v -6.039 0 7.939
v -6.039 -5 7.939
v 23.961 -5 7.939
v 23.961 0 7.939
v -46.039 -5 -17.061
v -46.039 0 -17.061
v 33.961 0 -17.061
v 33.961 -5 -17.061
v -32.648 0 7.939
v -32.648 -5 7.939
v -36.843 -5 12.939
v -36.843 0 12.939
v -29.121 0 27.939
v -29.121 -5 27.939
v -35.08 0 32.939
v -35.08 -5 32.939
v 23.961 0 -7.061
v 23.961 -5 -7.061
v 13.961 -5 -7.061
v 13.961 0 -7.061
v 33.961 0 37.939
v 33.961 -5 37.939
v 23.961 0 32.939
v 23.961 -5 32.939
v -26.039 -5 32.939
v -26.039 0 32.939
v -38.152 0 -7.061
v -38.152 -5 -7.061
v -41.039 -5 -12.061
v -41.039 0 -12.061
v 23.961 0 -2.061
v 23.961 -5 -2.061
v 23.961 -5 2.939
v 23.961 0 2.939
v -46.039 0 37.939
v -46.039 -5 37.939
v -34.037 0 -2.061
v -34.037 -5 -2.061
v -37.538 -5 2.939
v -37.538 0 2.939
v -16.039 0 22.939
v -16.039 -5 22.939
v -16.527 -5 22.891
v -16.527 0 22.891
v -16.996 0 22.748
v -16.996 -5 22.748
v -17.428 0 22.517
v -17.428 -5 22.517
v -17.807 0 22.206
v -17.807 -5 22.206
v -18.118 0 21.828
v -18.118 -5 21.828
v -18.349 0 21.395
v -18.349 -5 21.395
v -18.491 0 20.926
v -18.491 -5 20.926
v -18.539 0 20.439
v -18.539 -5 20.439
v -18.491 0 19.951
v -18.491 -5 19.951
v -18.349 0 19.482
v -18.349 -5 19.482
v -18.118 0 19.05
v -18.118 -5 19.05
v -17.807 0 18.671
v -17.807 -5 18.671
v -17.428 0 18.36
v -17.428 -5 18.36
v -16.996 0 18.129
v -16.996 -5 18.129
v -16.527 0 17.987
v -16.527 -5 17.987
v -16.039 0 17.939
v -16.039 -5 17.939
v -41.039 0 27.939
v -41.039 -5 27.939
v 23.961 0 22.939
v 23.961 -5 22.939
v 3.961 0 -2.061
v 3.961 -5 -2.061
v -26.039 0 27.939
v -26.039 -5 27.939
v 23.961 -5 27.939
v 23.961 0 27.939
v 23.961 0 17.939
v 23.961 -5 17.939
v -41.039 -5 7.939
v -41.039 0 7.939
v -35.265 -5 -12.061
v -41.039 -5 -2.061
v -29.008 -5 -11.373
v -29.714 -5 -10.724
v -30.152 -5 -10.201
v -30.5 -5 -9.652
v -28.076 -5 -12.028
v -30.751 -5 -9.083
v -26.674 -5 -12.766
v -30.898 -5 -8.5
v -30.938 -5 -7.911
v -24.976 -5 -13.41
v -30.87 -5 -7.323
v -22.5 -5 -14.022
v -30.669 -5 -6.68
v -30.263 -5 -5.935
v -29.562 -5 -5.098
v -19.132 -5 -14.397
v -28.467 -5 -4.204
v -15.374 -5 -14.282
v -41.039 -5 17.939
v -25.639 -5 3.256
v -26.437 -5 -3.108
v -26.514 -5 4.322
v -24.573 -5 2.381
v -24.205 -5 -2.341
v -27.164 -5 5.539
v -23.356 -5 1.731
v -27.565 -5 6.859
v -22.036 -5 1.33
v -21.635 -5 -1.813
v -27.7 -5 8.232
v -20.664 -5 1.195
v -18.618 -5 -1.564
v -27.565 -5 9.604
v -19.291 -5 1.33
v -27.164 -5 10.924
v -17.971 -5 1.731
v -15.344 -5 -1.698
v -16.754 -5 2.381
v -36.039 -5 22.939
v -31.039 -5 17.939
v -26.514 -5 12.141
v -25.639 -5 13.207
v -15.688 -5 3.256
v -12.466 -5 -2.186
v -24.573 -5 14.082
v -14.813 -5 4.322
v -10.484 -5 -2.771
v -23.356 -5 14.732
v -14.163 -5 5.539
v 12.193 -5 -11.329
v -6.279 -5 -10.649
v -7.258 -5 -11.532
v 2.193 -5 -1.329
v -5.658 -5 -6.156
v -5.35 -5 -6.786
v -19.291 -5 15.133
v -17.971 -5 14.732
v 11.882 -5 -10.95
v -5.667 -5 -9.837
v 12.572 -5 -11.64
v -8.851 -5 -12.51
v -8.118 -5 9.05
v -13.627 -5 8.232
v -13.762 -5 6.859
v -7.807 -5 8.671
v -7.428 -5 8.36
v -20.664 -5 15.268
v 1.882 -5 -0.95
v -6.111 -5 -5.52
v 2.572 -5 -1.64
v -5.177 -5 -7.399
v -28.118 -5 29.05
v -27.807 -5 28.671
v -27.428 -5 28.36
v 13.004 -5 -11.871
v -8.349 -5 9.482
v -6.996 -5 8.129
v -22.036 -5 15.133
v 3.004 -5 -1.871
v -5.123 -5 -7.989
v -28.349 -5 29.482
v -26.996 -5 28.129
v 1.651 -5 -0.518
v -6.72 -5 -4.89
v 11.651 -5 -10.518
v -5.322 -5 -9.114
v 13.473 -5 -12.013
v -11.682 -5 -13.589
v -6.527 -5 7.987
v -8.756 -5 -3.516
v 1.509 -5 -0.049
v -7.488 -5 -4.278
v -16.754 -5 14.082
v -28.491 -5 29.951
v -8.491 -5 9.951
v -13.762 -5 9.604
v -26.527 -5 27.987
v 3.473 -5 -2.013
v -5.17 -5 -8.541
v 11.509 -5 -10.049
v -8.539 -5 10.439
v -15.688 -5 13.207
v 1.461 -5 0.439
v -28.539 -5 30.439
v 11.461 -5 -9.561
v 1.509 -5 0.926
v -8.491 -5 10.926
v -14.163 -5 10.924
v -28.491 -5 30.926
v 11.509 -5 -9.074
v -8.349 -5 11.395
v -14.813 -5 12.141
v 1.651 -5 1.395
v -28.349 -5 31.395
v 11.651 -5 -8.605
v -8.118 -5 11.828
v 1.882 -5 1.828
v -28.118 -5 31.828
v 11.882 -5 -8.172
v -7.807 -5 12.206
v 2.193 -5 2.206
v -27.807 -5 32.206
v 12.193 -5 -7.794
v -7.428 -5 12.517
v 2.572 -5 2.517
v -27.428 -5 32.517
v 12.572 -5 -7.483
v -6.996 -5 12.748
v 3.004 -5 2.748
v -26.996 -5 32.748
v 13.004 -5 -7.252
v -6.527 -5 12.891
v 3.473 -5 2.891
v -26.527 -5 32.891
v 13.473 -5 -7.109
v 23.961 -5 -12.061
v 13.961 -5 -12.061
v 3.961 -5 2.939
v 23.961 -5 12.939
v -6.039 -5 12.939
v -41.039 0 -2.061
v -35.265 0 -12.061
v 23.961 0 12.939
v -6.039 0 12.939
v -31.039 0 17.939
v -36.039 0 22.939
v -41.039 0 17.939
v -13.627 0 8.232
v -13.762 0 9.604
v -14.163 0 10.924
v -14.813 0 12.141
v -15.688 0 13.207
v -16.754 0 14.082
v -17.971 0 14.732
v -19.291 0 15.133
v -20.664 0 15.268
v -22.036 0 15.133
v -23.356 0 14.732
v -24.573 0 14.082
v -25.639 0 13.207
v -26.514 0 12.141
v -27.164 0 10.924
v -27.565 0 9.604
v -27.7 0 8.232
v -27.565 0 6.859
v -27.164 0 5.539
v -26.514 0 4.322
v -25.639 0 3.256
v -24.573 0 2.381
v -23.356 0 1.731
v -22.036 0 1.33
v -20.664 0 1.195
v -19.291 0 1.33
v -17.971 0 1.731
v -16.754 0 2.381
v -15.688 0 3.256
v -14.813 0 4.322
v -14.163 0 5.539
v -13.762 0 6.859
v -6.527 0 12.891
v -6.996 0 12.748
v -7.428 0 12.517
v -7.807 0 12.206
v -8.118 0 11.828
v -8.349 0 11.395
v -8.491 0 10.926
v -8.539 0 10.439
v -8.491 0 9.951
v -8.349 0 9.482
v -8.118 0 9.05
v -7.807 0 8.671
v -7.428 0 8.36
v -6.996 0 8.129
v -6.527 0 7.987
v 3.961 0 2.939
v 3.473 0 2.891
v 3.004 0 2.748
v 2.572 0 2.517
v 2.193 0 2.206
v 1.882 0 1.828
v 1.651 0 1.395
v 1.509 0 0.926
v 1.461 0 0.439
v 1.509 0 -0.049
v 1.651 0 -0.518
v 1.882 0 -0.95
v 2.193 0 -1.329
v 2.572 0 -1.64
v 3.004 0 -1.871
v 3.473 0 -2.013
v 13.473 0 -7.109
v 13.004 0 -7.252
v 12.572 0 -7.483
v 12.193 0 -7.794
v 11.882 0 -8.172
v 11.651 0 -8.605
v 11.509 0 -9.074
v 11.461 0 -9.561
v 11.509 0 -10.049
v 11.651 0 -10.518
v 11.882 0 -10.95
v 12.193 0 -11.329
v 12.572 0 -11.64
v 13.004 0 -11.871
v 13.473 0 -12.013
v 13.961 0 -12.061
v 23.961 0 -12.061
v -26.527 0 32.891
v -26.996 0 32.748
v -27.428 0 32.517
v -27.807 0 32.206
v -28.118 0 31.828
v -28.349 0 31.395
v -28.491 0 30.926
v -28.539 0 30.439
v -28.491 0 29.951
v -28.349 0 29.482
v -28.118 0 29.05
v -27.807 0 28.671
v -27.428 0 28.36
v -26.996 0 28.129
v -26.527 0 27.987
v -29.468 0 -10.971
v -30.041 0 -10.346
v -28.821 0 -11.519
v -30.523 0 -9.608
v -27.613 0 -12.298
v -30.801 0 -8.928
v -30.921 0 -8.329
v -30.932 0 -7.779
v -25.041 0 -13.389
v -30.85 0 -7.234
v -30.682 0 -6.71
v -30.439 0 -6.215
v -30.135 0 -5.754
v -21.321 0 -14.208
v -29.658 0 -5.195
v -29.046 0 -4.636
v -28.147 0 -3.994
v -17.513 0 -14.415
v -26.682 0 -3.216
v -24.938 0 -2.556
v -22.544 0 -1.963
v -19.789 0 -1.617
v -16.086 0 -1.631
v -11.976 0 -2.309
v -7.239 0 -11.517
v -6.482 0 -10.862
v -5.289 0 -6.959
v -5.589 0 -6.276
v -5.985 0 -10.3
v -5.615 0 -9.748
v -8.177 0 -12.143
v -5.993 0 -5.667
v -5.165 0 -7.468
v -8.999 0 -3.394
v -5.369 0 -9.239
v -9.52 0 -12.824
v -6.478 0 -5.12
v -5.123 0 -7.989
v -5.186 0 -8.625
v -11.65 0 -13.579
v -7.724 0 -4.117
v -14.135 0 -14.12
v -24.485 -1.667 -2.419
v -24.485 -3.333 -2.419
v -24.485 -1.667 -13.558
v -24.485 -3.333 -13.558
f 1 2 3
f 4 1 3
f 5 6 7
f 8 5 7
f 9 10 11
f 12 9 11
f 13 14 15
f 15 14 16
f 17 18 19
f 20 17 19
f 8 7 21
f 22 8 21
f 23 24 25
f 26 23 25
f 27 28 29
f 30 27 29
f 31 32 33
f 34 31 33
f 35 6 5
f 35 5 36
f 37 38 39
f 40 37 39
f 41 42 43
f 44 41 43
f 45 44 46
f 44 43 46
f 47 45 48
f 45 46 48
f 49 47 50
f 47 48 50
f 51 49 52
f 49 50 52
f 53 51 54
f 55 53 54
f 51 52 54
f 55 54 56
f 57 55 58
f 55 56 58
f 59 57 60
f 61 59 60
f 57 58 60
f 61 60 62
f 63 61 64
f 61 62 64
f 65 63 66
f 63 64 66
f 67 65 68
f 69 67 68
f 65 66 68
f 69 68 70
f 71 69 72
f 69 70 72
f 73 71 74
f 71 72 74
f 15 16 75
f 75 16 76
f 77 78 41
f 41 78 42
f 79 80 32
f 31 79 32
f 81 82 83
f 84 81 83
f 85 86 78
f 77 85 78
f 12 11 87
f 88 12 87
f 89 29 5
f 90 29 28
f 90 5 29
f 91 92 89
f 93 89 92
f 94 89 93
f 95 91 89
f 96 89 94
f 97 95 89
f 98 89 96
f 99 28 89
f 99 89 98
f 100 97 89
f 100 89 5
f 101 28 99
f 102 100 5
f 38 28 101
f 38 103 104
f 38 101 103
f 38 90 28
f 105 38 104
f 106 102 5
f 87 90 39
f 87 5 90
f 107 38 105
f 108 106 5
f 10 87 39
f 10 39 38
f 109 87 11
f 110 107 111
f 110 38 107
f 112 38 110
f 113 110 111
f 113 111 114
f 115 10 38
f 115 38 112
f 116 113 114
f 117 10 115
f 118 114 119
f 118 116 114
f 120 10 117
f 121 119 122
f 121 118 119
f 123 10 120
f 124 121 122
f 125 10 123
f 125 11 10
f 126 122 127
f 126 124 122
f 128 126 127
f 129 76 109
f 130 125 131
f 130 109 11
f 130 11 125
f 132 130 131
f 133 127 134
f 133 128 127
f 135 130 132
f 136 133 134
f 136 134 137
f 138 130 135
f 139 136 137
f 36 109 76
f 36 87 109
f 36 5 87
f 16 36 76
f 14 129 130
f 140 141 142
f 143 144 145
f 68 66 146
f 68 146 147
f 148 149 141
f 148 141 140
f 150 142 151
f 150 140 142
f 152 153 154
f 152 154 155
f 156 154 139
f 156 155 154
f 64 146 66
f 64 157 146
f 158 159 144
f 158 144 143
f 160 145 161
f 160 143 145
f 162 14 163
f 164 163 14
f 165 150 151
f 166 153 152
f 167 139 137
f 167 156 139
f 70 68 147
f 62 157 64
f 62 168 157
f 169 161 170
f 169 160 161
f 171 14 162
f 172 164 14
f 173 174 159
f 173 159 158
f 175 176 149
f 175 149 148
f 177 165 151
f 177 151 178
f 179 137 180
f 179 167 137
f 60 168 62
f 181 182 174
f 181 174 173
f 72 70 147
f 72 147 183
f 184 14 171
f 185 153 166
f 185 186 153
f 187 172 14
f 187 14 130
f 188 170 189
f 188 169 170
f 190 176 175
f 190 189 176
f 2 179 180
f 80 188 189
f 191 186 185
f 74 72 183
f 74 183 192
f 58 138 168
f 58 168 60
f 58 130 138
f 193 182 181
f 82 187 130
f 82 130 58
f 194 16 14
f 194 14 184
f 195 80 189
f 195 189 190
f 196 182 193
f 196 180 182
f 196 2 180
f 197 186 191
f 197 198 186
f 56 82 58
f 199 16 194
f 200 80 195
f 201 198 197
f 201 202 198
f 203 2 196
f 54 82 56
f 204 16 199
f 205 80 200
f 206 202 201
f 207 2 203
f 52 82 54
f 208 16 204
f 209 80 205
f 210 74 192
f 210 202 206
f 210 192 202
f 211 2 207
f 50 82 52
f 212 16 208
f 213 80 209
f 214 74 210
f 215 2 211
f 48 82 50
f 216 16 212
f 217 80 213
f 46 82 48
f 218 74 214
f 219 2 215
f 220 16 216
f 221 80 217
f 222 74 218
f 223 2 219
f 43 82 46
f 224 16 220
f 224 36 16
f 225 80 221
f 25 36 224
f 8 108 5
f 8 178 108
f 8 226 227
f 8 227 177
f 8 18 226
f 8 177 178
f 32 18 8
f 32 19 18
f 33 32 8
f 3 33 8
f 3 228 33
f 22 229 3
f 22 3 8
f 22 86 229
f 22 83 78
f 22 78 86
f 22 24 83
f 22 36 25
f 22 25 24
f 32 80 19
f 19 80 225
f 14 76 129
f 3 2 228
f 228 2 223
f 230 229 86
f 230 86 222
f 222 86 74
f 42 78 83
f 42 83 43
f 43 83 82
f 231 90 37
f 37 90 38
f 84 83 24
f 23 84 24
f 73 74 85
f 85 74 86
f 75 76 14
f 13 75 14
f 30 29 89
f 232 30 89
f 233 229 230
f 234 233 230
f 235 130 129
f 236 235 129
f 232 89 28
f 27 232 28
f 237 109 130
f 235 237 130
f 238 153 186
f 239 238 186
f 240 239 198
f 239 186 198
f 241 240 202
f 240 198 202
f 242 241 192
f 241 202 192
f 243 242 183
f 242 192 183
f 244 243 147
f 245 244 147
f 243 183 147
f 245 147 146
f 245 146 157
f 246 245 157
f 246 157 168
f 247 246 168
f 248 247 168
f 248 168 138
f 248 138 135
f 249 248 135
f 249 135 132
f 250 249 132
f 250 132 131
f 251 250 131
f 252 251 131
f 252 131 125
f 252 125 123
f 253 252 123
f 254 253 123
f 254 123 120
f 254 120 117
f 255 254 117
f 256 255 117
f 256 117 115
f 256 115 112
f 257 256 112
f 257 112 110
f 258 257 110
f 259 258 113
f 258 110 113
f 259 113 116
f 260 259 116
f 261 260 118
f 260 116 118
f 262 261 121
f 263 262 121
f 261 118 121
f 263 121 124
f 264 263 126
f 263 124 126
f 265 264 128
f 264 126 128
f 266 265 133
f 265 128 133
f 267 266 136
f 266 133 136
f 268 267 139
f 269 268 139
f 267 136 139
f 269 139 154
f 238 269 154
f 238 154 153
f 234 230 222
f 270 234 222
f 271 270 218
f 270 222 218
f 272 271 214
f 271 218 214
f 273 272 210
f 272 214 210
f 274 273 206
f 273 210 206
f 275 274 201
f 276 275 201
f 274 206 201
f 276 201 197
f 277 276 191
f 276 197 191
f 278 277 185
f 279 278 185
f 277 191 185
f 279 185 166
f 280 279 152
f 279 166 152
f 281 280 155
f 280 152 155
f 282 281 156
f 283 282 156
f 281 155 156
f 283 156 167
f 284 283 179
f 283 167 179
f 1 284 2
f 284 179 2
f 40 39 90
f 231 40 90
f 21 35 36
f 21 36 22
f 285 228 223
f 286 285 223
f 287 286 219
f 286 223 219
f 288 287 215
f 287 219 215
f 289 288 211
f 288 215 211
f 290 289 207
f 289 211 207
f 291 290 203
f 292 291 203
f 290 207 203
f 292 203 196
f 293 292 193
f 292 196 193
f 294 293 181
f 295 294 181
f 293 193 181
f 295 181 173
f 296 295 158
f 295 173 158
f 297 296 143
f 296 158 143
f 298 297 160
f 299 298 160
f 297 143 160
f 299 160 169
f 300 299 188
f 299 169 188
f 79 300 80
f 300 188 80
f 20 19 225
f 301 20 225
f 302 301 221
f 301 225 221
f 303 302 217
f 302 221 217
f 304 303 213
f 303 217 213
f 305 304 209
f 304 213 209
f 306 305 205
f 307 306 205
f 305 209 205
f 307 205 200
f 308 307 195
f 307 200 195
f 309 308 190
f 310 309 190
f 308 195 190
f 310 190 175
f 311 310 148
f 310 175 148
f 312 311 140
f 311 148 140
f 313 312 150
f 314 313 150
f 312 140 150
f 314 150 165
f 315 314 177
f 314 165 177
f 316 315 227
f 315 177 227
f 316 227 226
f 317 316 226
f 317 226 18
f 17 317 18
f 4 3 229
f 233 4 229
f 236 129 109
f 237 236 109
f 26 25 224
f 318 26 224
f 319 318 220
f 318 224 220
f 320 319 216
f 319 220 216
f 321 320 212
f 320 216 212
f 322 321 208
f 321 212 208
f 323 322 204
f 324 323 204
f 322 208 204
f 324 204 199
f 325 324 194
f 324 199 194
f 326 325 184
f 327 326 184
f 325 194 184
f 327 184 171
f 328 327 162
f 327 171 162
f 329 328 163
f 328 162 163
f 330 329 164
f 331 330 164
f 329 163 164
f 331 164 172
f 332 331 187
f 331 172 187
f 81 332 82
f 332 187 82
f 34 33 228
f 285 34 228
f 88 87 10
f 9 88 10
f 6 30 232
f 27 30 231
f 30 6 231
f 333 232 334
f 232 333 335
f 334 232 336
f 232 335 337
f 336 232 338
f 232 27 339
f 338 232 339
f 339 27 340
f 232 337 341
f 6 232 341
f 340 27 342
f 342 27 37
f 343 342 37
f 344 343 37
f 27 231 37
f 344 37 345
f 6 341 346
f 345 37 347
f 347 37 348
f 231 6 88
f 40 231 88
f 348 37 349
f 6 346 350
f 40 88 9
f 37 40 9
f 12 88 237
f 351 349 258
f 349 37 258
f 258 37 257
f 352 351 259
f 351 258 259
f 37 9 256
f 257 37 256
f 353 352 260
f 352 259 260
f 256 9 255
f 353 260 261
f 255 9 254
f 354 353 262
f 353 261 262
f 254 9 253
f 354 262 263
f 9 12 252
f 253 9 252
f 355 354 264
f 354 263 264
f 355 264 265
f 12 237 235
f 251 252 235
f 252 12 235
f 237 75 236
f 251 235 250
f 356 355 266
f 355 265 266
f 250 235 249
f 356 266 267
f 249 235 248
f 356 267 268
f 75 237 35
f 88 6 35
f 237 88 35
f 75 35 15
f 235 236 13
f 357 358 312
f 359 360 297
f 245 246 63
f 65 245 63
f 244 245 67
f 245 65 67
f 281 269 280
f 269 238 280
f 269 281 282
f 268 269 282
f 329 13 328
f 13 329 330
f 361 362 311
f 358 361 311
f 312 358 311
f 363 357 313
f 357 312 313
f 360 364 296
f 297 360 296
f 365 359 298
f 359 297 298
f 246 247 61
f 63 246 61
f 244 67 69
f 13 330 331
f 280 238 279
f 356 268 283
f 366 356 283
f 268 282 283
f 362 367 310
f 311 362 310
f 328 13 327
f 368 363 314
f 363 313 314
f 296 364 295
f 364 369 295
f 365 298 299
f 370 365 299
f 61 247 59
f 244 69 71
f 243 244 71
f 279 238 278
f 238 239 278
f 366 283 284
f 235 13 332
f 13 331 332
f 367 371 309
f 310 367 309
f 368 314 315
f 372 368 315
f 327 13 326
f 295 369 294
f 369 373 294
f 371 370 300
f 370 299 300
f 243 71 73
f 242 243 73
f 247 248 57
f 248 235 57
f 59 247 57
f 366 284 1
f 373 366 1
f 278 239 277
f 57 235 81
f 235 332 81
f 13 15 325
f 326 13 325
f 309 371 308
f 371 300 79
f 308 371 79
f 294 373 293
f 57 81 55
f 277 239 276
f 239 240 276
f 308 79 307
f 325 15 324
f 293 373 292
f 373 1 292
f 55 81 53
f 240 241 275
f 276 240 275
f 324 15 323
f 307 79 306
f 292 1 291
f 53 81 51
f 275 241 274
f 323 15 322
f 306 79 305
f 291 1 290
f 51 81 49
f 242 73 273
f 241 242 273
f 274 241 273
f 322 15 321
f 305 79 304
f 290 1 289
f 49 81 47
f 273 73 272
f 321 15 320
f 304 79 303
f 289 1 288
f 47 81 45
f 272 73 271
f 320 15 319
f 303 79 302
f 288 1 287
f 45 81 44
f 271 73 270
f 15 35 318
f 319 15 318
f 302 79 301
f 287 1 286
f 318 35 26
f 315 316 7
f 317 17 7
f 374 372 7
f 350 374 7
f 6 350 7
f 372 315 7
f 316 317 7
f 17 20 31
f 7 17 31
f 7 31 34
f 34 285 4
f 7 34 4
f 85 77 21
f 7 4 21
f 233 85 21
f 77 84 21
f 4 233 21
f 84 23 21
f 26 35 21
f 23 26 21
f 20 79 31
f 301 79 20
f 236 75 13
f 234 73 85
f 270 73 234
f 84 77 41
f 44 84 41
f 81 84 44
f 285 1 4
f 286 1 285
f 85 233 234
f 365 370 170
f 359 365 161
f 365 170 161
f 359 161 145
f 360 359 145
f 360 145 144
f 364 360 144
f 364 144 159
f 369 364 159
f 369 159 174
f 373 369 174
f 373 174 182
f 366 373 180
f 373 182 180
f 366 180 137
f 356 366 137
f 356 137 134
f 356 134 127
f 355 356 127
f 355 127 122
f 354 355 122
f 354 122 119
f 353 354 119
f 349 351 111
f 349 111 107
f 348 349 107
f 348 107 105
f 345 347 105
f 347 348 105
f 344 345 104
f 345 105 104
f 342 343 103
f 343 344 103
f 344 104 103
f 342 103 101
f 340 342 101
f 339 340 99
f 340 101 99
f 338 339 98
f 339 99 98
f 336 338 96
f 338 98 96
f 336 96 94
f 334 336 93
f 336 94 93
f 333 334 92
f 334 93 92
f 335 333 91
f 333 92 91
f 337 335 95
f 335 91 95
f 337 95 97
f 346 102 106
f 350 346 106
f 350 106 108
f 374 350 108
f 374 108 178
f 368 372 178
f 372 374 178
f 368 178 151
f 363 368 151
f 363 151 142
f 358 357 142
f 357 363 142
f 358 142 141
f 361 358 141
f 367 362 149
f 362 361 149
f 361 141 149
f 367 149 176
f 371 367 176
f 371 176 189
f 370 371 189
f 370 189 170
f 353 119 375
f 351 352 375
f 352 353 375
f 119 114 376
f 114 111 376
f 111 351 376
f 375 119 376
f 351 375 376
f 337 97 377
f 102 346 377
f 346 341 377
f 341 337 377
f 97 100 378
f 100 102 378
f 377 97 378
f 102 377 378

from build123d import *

# Parameters (mm, degrees)
F0_W     = 80
F0_H     = 55
F1_DEPTH = 5
F3_DEPTH = 25
F5_DEPTH = 10
F6_R     = 7.036386
F7_DEPTH = 10


with BuildPart() as f1:
    # F0 (on Front) → F1 (new body)
    with BuildSketch(Plane.XZ):
        with Locations((-6.038838, 10.438722)):
            Rectangle(F0_W, F0_H)
    extrude(amount=F1_DEPTH)

    # F2 (on face) → F3 (cut)
    with BuildSketch(Plane.XZ.offset(5)):
        with BuildLine():
            Line((13.961162, -12.061278), (23.961162, -12.061278))
            Line((23.961162, -12.061278), (23.961162, -7.061278))
            Line((23.961162, -7.061278), (13.961162, -7.061278))
            ThreePointArc((13.961162, -7.061278), (11.461162, -9.561278), (13.961162, -12.061278))
        make_face()
        with BuildLine():
            Line((3.961162, -2.061278), (23.961162, -2.061278))
            Line((23.961162, -2.061278), (23.961162, 2.938722))
            Line((23.961162, 2.938722), (3.961162, 2.938722))
            ThreePointArc((3.961162, 2.938722), (1.461162, 0.438722), (3.961162, -2.061278))
        make_face()
        with BuildLine():
            Line((-6.038838, 7.938722), (23.961162, 7.938722))
            Line((23.961162, 7.938722), (23.961162, 12.938722))
            Line((23.961162, 12.938722), (-6.038838, 12.938722))
            ThreePointArc((-6.038838, 12.938722), (-8.538838, 10.438722), (-6.038838, 7.938722))
        make_face()
        with BuildLine():
            Line((-16.038838, 17.938722), (23.961162, 17.938722))
            Line((23.961162, 17.938722), (23.961162, 22.938722))
            Line((23.961162, 22.938722), (-16.038838, 22.938722))
            ThreePointArc((-16.038838, 22.938722), (-18.538838, 20.438722), (-16.038838, 17.938722))
        make_face()
        with BuildLine():
            Line((-26.038838, 27.938722), (23.961162, 27.938722))
            Line((23.961162, 27.938722), (23.961162, 32.938722))
            Line((23.961162, 32.938722), (-26.038838, 32.938722))
            ThreePointArc((-26.038838, 32.938722), (-28.538838, 30.438722), (-26.038838, 27.938722))
        make_face()
    extrude(amount=-F3_DEPTH, mode=Mode.SUBTRACT)

    # F4 (on face) → F5 (cut)
    with BuildSketch(Plane.XZ.offset(5)):
        Polygon((-38.152087, -7.061278), (-41.038838, -12.061278), (-38.152087, -12.061278), (-35.265335, -12.061278), align=None)
        Polygon((-37.5378, 2.938722), (-41.038838, -2.061278), (-37.5378, -2.061278), (-34.036763, -2.061278), align=None)
        Polygon((-36.84334, 12.938722), (-41.038838, 7.938722), (-36.84334, 7.938722), (-32.647842, 7.938722), align=None)
        Polygon((-36.038838, 22.938722), (-41.038838, 17.938722), (-36.038838, 17.938722), (-31.038838, 17.938722), align=None)
        Polygon((-35.08007, 32.938722), (-41.038838, 27.938722), (-35.08007, 27.938722), (-29.121302, 27.938722), align=None)
    extrude(amount=-F5_DEPTH, mode=Mode.SUBTRACT)

    # F6 (on face) → F7 (cut)
    with BuildSketch(Plane.XZ.offset(5)):
        with Locations((-20.663561, 8.231624)):
            Circle(F6_R)
        with BuildLine():
            add(Edge.make_bspline(
                [(-5.122506, -7.988823), (-5.122506, 3.150482), (-24.485134, -2.419171), (-43.847762, -7.988823), (-24.485134, -13.558475), (-5.122506, -19.128127), (-5.122506, -7.988823)],
                knots=[0, 0, 0, 2.094395, 2.094395, 4.18879, 4.18879, 6.283185, 6.283185, 6.283185], degree=2, weights=[1, 0.5, 1, 0.5, 1, 0.5, 1]))
        make_face()
    extrude(amount=-F7_DEPTH, mode=Mode.SUBTRACT)


solid = f1.part
